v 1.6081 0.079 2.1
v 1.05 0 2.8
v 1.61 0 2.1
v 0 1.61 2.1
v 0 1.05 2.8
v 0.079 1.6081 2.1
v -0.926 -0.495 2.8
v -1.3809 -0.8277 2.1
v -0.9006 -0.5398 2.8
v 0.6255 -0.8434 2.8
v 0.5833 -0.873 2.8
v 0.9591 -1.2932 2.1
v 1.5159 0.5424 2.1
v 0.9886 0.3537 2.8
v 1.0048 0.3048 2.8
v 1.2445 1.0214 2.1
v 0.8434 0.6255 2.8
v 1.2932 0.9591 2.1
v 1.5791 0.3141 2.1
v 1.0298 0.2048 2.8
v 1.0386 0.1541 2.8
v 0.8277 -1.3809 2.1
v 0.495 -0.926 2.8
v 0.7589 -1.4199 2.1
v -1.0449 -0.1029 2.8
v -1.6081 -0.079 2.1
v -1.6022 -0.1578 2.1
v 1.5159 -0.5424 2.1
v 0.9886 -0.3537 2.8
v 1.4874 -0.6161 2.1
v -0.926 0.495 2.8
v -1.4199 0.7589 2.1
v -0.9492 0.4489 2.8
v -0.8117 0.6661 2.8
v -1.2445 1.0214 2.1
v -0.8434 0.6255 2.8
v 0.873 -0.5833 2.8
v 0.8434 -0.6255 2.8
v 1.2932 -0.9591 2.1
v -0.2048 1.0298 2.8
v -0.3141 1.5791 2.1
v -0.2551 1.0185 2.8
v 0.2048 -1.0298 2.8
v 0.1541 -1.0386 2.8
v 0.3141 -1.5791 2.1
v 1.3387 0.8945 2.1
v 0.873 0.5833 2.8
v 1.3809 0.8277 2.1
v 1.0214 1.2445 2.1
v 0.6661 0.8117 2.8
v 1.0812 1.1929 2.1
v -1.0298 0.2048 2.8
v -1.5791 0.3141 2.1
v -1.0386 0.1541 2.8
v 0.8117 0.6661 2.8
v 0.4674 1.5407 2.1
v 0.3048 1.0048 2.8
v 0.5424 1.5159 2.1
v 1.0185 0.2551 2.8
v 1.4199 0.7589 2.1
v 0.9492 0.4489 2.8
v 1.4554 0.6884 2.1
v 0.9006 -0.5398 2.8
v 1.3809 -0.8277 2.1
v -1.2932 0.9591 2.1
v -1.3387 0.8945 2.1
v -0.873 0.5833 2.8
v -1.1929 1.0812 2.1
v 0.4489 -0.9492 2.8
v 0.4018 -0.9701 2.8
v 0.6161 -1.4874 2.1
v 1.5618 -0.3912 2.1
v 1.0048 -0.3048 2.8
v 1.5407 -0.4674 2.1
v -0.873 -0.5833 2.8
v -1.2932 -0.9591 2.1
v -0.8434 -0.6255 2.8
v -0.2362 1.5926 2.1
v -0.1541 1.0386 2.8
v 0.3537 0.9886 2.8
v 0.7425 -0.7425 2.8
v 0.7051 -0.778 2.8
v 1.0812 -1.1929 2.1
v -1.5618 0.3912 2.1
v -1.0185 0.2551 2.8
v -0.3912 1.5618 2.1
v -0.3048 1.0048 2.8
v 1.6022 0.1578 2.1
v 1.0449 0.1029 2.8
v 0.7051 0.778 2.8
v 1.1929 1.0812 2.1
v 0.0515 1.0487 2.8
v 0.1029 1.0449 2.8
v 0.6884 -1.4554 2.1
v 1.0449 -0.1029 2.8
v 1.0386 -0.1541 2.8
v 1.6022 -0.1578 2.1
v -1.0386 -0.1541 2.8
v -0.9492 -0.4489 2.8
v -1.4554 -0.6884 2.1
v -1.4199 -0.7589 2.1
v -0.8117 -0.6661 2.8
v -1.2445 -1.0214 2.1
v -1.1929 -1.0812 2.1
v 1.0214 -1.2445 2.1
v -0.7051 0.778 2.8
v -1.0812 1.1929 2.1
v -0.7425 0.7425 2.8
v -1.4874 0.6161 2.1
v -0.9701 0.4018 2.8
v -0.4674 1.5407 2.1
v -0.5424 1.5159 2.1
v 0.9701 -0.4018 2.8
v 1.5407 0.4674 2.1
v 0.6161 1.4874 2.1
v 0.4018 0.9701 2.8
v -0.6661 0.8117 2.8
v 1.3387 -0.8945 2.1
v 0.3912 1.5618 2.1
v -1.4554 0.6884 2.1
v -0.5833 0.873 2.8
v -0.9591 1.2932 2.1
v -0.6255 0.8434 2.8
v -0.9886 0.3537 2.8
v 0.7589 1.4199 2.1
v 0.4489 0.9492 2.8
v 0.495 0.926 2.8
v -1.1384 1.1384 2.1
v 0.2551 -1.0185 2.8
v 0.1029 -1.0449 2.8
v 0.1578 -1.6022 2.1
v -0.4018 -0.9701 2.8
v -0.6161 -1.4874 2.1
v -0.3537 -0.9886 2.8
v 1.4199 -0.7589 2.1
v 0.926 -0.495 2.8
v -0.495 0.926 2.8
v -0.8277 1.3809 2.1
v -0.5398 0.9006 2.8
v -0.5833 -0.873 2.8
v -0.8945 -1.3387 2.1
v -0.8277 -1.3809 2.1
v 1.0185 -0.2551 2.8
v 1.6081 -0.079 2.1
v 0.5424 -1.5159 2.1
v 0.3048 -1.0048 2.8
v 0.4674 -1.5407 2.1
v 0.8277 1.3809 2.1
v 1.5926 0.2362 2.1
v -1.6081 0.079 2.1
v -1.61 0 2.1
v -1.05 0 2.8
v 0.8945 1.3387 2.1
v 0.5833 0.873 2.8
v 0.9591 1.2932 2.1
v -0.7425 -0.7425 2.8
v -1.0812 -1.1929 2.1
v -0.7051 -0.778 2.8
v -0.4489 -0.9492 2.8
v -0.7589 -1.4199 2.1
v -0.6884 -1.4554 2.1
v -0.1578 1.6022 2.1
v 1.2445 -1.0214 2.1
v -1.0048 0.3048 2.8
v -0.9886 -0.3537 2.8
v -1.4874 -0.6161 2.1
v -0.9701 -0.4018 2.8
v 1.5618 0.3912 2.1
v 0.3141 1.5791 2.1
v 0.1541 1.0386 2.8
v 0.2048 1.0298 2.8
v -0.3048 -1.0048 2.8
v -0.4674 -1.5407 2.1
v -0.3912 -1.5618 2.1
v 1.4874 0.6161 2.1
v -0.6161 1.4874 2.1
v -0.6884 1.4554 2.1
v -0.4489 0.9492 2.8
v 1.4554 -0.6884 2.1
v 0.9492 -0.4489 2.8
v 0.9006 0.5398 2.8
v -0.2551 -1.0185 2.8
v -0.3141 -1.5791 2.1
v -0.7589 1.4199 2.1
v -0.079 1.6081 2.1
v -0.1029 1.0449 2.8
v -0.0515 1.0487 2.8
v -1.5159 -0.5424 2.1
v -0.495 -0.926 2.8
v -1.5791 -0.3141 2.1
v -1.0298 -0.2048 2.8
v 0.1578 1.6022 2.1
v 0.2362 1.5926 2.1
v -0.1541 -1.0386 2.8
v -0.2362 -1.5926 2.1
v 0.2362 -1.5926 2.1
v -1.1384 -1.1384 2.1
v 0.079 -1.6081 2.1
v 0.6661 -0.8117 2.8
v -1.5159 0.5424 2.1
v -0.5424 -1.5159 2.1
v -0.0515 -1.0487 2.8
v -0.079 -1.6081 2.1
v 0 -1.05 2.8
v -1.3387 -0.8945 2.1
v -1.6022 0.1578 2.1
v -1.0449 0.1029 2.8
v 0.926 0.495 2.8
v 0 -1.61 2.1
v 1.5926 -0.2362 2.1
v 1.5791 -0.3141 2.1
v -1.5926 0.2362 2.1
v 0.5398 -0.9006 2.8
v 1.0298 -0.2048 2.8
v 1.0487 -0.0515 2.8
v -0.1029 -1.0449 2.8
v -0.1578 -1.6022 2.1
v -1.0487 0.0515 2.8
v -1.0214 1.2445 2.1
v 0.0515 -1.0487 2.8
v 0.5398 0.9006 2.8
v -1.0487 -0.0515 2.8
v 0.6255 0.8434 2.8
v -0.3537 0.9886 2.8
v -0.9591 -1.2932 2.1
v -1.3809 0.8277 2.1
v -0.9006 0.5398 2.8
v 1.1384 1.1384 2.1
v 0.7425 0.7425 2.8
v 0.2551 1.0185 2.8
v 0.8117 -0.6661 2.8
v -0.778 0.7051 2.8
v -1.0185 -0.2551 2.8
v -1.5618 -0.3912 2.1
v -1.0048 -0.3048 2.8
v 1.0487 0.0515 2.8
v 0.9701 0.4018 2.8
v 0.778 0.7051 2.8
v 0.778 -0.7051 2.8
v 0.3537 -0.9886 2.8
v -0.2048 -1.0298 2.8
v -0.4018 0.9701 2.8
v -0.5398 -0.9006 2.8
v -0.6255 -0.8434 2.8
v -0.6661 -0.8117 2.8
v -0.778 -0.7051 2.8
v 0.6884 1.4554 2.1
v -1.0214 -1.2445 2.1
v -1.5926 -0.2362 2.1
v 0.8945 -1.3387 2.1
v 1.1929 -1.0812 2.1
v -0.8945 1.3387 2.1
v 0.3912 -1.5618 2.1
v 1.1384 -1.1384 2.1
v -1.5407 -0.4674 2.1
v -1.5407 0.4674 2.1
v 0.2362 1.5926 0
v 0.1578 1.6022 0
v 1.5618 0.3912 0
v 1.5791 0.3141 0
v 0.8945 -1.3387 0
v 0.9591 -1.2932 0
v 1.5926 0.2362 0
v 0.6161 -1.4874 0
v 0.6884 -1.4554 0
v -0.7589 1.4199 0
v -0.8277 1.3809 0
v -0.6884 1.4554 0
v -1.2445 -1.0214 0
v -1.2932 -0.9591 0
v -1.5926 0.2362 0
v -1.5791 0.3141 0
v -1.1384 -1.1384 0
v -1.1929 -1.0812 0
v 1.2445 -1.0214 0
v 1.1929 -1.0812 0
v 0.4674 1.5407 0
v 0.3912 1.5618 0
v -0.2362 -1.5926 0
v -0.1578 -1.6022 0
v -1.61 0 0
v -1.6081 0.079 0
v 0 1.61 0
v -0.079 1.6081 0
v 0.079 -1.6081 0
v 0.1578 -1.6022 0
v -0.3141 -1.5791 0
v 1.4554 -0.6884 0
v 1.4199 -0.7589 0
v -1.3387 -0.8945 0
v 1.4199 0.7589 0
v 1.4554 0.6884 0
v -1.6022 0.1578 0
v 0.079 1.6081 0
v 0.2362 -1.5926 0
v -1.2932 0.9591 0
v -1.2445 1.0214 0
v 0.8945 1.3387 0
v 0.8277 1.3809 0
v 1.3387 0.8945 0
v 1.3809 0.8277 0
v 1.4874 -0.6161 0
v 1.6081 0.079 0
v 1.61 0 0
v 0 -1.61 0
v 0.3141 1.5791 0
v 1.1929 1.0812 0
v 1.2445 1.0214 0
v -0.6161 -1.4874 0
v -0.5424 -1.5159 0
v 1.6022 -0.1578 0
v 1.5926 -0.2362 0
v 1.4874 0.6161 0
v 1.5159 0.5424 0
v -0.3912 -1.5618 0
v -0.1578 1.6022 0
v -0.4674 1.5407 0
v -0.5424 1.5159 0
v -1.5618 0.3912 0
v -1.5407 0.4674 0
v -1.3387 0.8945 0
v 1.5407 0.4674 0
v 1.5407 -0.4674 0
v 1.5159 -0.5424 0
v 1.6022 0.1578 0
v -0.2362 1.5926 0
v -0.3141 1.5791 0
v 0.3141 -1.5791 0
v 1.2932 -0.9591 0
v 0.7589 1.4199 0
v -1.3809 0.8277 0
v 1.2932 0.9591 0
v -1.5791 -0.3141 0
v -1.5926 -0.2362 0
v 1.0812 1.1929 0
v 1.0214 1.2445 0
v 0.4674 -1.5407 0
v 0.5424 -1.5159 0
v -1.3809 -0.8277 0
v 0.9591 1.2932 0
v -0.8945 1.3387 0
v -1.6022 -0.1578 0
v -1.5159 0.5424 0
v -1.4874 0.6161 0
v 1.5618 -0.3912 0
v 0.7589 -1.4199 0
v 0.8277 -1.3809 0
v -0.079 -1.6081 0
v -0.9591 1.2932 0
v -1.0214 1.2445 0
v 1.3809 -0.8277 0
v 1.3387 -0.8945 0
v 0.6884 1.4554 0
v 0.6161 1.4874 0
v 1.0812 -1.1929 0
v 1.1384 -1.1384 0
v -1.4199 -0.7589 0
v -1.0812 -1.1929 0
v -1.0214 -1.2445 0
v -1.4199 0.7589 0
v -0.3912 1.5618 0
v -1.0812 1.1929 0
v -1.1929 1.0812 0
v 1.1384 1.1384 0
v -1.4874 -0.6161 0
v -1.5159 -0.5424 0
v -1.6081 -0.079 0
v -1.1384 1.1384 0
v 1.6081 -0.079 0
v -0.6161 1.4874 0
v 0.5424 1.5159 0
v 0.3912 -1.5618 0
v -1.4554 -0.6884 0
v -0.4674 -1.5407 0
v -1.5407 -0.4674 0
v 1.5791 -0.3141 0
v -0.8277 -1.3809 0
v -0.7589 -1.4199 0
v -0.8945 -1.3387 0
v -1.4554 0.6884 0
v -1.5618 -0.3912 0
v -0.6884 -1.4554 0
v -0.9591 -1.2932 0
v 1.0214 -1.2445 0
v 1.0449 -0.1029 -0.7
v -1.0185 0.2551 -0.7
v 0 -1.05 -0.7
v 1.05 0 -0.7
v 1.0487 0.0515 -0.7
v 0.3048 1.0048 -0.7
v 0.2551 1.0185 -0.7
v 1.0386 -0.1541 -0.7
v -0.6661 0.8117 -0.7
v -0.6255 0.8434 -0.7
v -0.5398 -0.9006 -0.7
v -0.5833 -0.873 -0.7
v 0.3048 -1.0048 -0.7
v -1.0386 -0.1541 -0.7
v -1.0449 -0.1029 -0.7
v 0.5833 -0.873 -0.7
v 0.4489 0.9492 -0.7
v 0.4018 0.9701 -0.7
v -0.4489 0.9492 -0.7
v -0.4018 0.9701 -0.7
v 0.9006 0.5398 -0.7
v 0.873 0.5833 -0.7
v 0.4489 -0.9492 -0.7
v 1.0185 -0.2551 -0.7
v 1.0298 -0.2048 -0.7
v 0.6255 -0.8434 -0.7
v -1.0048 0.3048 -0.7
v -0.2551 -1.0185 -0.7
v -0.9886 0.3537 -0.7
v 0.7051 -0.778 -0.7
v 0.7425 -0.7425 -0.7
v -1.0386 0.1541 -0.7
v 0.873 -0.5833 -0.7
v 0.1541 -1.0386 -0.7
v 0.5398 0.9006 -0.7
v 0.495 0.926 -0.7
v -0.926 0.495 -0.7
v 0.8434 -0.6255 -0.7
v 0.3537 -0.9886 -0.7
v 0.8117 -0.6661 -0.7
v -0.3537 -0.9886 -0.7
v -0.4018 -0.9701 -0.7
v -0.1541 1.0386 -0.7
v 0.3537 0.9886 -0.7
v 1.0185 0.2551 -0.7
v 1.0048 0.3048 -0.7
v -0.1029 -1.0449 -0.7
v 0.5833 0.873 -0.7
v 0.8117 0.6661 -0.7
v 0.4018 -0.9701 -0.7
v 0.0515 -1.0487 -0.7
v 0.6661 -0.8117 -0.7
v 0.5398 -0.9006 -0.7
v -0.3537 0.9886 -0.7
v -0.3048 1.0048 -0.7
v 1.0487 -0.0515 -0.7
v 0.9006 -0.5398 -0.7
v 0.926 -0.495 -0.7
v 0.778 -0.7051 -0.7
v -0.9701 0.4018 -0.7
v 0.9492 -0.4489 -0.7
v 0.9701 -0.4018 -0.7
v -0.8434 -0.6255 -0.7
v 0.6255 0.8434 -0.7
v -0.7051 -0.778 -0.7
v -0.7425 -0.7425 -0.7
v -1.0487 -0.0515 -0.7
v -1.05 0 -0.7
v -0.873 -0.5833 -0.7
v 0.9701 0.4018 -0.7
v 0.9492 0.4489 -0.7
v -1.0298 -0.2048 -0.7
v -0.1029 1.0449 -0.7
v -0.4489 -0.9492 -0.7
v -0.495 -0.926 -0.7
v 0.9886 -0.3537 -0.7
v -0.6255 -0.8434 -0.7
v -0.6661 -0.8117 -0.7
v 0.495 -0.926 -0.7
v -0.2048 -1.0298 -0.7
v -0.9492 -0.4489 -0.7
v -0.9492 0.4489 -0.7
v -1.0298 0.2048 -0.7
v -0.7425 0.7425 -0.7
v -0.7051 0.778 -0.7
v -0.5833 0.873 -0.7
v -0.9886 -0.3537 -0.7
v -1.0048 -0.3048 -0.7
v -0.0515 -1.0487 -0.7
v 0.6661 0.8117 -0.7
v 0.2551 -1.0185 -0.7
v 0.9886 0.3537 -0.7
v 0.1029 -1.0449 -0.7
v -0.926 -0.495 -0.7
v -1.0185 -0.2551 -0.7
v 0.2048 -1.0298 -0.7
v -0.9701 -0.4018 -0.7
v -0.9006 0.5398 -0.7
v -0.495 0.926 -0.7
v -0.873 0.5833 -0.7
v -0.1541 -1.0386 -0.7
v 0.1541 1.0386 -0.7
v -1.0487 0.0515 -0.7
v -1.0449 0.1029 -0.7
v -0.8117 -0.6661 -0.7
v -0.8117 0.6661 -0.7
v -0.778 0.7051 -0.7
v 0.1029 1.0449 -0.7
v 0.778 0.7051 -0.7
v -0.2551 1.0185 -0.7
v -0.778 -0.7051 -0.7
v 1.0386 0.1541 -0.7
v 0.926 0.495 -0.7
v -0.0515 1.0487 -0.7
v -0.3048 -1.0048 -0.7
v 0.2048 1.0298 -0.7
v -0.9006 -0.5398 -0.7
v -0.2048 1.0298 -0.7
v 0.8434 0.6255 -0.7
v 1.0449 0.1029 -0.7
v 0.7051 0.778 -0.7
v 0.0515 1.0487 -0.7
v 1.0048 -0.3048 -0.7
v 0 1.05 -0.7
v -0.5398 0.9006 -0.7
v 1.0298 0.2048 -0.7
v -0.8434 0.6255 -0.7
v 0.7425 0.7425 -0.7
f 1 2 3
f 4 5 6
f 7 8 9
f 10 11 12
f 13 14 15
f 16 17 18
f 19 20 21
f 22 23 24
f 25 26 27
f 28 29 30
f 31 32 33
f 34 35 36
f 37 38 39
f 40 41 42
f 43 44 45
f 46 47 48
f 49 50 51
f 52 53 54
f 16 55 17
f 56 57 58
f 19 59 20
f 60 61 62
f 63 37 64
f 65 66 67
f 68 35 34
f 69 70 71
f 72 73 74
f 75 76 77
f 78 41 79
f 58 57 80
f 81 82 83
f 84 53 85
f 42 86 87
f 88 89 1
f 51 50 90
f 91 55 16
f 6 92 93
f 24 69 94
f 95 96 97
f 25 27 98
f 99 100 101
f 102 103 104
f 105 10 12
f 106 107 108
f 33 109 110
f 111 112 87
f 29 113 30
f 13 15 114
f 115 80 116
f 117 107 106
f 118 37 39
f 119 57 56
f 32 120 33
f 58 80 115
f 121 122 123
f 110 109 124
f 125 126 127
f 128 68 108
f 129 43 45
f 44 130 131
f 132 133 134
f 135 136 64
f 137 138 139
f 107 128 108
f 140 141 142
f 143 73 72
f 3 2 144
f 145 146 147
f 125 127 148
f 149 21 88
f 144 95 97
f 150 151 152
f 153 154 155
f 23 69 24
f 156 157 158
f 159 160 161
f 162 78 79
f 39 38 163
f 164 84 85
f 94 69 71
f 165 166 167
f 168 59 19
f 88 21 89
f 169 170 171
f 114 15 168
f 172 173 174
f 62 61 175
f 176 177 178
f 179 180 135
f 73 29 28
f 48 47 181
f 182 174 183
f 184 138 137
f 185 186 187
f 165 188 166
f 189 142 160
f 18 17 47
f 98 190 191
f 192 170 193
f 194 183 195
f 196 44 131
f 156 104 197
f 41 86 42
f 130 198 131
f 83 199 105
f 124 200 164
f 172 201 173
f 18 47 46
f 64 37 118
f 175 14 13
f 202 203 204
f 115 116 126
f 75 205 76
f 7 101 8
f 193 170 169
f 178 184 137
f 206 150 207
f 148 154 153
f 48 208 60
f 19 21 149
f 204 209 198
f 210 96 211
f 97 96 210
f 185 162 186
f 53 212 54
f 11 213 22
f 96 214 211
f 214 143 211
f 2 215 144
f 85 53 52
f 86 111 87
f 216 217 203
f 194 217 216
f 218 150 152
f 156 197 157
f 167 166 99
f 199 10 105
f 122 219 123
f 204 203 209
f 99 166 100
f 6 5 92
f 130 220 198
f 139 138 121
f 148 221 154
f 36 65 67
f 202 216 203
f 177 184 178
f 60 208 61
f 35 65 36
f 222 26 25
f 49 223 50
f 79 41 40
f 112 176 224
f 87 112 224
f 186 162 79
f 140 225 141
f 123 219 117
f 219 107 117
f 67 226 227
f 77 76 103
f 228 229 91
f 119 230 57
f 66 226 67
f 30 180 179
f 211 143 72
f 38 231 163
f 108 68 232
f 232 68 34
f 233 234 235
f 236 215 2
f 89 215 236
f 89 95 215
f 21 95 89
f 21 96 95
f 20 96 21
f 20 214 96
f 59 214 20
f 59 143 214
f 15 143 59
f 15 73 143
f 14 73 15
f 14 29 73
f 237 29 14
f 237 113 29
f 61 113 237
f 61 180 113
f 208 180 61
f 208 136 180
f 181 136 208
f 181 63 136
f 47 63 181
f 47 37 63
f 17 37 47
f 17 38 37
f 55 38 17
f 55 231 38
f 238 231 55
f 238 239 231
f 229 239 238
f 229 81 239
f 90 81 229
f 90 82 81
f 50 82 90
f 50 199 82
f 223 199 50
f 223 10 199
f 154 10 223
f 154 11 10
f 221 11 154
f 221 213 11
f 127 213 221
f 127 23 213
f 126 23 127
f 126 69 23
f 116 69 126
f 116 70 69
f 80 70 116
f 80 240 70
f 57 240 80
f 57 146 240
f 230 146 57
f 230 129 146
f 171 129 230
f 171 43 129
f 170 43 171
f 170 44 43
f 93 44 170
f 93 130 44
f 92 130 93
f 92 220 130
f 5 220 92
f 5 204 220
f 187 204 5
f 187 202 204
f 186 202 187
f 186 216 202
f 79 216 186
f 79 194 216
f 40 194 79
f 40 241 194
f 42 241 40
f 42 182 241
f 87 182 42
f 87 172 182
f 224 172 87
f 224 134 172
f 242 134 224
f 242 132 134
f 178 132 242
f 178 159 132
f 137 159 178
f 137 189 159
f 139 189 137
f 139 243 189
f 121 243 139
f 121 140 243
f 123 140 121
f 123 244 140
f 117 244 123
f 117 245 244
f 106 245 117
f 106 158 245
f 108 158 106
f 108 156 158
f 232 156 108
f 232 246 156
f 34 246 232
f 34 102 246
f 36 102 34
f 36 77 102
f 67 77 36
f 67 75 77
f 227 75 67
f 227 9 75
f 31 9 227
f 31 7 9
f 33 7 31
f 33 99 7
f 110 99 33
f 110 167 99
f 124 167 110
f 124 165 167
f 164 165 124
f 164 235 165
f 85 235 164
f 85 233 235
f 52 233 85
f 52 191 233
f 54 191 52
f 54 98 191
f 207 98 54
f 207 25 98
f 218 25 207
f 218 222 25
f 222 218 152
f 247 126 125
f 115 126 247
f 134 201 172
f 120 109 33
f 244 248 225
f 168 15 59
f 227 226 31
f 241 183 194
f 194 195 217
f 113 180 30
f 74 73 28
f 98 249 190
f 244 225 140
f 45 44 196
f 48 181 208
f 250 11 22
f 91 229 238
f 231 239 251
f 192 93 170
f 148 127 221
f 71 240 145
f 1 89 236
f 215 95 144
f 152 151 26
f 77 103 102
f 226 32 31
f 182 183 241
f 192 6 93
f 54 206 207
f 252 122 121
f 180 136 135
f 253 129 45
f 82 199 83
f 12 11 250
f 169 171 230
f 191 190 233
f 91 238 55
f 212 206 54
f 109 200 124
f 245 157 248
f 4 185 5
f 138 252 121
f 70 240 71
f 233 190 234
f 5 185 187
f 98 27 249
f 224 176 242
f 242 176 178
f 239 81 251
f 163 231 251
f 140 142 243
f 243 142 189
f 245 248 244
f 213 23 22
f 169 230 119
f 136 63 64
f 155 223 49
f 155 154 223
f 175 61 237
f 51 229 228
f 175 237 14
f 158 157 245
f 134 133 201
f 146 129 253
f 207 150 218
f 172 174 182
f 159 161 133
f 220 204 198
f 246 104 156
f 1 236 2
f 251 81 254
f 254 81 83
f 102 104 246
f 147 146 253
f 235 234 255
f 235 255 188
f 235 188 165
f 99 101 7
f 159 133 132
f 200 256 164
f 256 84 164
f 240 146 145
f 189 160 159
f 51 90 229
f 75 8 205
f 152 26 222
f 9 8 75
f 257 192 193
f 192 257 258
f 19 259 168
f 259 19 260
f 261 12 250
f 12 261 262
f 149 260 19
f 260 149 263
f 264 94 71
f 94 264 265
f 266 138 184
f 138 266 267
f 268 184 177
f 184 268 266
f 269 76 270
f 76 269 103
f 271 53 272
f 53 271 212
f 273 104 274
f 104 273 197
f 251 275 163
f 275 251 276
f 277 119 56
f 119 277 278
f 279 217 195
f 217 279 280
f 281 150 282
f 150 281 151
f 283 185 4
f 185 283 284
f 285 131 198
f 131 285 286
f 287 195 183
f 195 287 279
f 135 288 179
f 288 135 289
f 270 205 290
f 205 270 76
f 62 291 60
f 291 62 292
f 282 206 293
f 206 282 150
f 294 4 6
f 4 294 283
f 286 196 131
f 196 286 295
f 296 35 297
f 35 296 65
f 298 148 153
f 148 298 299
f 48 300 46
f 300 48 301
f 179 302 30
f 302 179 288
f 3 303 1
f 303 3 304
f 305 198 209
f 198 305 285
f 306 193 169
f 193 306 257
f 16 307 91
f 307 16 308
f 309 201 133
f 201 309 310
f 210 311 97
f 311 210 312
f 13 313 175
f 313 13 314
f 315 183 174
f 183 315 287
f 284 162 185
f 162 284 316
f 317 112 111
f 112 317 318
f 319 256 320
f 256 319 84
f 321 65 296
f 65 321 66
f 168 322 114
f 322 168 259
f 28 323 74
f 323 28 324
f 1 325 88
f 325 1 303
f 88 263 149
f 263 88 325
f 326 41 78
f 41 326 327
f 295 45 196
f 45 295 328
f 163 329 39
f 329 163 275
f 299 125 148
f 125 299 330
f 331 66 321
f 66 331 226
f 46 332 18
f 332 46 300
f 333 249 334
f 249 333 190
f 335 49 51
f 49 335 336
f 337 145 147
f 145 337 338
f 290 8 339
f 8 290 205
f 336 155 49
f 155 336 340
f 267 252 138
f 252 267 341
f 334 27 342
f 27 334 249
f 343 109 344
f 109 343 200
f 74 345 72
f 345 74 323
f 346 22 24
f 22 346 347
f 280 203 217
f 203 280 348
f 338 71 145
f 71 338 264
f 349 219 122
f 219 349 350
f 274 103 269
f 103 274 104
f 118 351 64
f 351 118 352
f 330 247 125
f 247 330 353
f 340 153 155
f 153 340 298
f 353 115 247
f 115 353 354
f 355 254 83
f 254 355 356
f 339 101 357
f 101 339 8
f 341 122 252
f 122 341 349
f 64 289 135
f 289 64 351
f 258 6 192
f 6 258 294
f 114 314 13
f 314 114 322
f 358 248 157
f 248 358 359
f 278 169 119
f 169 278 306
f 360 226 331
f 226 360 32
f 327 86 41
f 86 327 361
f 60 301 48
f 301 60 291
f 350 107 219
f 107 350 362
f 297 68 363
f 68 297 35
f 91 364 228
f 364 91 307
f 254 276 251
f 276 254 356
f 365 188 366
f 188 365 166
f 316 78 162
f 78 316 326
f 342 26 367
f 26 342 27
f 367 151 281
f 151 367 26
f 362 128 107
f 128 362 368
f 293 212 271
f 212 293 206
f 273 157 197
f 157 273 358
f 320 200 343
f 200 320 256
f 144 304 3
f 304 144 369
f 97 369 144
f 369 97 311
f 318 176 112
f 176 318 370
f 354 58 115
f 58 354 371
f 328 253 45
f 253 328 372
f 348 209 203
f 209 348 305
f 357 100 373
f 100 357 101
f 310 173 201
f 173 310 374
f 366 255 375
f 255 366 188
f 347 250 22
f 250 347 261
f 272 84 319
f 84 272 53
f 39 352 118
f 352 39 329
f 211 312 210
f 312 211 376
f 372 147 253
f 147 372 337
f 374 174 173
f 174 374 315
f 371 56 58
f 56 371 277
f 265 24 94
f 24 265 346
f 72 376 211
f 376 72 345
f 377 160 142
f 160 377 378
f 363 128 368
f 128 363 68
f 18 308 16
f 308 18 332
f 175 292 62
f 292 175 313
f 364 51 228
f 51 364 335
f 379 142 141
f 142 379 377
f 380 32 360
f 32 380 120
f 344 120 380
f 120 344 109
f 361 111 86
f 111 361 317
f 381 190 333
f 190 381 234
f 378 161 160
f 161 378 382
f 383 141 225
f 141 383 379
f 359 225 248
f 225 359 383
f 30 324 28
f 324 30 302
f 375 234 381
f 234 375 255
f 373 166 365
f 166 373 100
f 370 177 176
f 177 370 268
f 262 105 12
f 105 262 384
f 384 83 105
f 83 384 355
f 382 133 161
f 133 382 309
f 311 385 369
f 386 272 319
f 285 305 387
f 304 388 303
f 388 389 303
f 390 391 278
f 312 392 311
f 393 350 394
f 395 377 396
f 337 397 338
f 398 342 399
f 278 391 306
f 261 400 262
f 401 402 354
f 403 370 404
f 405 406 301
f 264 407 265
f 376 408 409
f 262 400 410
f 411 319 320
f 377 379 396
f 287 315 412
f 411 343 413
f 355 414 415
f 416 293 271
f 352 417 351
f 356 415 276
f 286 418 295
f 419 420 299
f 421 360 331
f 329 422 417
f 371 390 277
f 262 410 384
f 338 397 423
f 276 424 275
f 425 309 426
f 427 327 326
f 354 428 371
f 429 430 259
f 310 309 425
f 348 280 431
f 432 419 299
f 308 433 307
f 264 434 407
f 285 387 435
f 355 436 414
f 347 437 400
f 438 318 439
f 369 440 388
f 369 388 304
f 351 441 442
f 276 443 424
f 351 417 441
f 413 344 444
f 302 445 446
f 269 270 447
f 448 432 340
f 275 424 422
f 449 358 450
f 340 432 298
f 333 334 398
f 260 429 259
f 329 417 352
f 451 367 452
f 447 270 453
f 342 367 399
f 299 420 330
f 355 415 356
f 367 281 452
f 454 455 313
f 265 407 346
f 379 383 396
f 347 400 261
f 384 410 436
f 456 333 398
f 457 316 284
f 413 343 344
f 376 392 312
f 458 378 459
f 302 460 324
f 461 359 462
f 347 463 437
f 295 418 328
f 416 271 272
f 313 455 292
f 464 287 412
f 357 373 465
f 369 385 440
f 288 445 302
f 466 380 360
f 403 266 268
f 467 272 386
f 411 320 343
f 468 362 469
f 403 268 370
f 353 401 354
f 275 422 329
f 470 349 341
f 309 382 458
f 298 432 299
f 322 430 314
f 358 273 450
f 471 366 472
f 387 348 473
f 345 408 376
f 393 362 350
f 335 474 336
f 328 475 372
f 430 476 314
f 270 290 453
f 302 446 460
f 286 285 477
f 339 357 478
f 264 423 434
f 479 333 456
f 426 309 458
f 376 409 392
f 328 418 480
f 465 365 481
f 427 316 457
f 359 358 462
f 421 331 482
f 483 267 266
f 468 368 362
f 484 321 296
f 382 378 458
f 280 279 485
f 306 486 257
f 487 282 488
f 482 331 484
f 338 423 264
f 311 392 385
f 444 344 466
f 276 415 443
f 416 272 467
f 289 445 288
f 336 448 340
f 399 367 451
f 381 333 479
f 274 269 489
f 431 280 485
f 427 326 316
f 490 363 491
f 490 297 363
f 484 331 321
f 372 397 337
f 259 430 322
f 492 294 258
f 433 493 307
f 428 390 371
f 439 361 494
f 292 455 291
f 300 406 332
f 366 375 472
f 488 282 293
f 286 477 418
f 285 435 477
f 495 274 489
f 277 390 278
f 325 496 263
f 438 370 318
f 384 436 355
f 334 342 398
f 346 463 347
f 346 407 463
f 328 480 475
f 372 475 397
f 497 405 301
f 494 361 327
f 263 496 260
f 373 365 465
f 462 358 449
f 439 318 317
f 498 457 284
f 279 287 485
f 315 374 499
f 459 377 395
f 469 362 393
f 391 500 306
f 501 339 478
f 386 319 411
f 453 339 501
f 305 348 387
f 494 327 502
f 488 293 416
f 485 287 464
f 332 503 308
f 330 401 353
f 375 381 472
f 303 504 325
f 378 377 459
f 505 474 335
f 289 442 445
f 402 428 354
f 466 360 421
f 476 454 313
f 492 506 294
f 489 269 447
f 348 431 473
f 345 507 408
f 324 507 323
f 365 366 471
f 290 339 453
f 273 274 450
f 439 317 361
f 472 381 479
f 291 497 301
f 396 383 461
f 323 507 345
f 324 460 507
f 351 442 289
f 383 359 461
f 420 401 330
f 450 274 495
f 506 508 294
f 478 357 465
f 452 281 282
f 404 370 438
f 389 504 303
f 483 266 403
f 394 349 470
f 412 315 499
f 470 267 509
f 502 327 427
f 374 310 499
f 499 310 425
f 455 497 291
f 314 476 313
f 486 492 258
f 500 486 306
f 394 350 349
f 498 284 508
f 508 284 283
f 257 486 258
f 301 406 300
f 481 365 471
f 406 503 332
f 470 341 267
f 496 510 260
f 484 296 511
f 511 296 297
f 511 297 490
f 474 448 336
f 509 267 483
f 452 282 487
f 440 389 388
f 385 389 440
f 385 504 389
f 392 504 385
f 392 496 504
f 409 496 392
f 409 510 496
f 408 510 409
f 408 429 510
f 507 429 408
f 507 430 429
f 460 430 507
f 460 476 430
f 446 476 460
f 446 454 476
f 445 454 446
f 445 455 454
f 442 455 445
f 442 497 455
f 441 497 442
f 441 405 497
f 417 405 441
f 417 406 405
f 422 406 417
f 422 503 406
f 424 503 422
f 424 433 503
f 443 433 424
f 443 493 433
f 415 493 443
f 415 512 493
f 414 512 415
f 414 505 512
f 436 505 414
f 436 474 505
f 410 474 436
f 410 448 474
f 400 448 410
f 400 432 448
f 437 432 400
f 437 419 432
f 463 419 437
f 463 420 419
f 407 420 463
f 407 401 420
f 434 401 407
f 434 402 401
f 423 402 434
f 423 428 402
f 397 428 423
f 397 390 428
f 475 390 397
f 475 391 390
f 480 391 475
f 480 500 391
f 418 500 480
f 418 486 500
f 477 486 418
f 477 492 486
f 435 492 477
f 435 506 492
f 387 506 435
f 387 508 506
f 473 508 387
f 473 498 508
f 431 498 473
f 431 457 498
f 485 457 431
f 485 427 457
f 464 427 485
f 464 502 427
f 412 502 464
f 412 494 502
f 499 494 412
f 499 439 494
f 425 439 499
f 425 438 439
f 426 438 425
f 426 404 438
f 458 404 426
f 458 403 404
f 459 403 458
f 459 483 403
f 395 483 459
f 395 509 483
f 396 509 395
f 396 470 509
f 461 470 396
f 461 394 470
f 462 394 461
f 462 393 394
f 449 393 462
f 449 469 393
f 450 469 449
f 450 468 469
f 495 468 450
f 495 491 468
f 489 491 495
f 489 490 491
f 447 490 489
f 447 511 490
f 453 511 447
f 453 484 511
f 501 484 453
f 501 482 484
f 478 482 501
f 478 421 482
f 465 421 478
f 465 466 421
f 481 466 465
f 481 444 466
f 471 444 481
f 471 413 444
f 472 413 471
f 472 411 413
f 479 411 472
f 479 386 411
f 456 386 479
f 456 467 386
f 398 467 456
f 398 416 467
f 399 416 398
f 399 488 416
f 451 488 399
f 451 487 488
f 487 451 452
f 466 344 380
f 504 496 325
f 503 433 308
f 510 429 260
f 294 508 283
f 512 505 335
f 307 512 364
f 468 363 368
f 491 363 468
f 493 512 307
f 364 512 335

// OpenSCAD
//A 19x19 board should measure 454.5 mm from top to bottom by 424.2 mm from left to right. It should be 151.5 mm thick.

// The lines are typically 1 mm thick. They should be spaced 22 mm apart left to right and 23.7 mm apart top to bottom.

// Star point markers are typically 4 mm in diameter.
//svg fix https://www.svgminify.com/

xSpacing=23.7;
ySpacing=22;
lThickness=1;
starR=2;
borderW=14;
thickness=4;
lineDepth=0.2;
stoneR=11.05;

$fn=128;

// color("black")
// scale(0.7) stone(7.5);
scale(0.7) {
  translate([0,0,3]) cylinder(r1=2.3, r2=1.5,h=1);
  cylinder(r=2.3,h=3);
  translate([0,0,-1]) cylinder(r2=2.3, r1=1.5,h=1);
}
// scale(0.7) halfStone();

// stlGoClubBoard();

// scale(1.7) {
  // bowl();
 // translate([0,0,17.8]) lid();
// }
// cherryBlossomBoard();
//dragonPhoenixBoard();

// board9x9();

module halfStone() {
  difference() {
    stone(100);
    translate([0,0,-100]) cylinder(r=100,h=100);
    translate([0,0,-0.1]) cylinder(r=2.5,h=3.1);
   // translate([0,-1000,0]) cube([1000,2000,1000]);
  }
}

module dragonPhoenixBoard() {
  scale([0.7,0.7,1]) difference() {
    board13x13();
    // phoenix();
    // dragon();
    dragonOutline();
    phoenixOutline();
  }
}

module dragonShape() {
  render() translate([-4,20]) mirror([1,0,0]) scale(0.22) rotate([0,0,90]) difference() {
    translate([300,1]) square([260,740]);
    import("dragon-phoenix-simplified.svg");
  }
}

module phoenixShape() {
  render() translate([0,-157]) scale(0.22) rotate([0,0,85]) difference() {
    translate([0,1]) square([300,740]);
    import("dragon-phoenix-simplified.svg");
  }
}

module dragonOutline() {
  color("black")
  translate([0,0,-0.01]) 
  linear_extrude(height=0.02)
  difference() {
    offset(r=1) dragonShape();
    dragonShape();
  }
}

module dragon() {
  color("#00918d")
  // translate([0,0,-0.01]) 
  linear_extrude(height=0.02) dragonShape();
}
module phoenixOutline() {
  color("black")
  translate([0,0,-0.01]) 
  linear_extrude(height=0.02)
  difference() {
    offset(r=1) phoenixShape();
    phoenixShape();
  }
}

module phoenix() {
  color("#8c2f12") 
  // translate([0,0,-0.01]) 
  linear_extrude(height=0.02) phoenixShape();
}

module cherryBlossomBoard() {
  difference() {
    scale([0.7,0.7,1]) board13x13();
    translate([-128,-128,-0.1]) color("pink") linear_extrude(height=0.2) projection()  import("cherryblossom.stl");
  }
}

module cherryBlossoms() {
  translate([0,0,-0.01]) linear_extrude(height=0.02) projection() linear_extrude(height=1) {
      translate([48,-100,0]) scale(0.35) import("cherryblossombutterfly_Layer 1.svg");
      translate([-105,45,0]) scale(0.35) import("cherryblossombutterfly_Layer 2.svg");
  }
}

module lid() {
  $fn=128;

  scale([1,1,0.3]) difference() {
    union() {
      sphere(r=21);
      cylinder(r=21.1,h=2.5);
    }
    translate([-25,-25,-50]) cube([50,50,50]);
    translate([0,0,-2]) sphere(r=20.5);
  }
  translate([0,0,-2]) difference() {
    union() {
      intersection() {
        cylinder(r=17.9,h=10);
        translate([0,0,2]) scale([1,1,0.3]) sphere(r=21);
      }
      nubR=0.75;
      nubD=17.7;
      nubZ=0.75;

      translate([nubD,0,nubZ]) sphere(r=nubR);
      rotate([0,0,360/3]) translate([nubD,0,nubZ]) sphere(r=nubR);
      rotate([0,0,360/3*2]) translate([nubD,0,nubZ]) sphere(r=nubR);
    }
    translate([0,0,0]) scale([1,1,0.3]) sphere(r=17.4);
  }

}

module bowl() {
  $fn=128;

  nubR=0.9;
  nubD=17.7;
  difference() {
    bowlShape();
    cylinder(r=18,h=50);
    scale(0.92) bowlShape();
    translate([nubD,0,10]) cylinder(r=nubR,h=5);
    rotate([0,0,360/3]) translate([nubD,0,10]) cylinder(r=nubR,h=5);
    rotate([0,0,360/3*2]) translate([nubD,0,10]) cylinder(r=nubR,h=5);
  }
}

module bowlShape() {
 hull() rotate_extrude(angle=360) 
  translate([14,0,0])  
    {
      intersection() {
        scale([1,1.6]) circle(r=10);
        translate([-10,0]) square([20,14]);
      }
      intersection() {
        circle(r=10);
        translate([-10,-10]) square([20,10]);
      }
    }
}


module clubName() {
  translate([103,-95,0]) mirror([1,0,0]) linear_extrude(1) {
    translate([0,9]) text("St. Louis Go Club", font = "Arial Black:Bold", size = 6.5);
    text("https://baduk.club/club/stl", font = "Arial Black:Bold", size = 4);
  }
}

module clubText() {
  render()
    translate([87,81,0]) qrCode();
    rotate([0,0,180]) translate([87,81,0]) qrCode();
    translate([0,0,0]) clubName();
    translate([0,0,0]) rotate([0,0,180]) clubName();
}

module stlGoClubBoard() {
  difference() {
    scale([0.7,0.7,1]) board13x13(); 
    color("black") translate([0,0,-0.99]) clubText();
  }
}

module qrCode() {
  linear_extrude(height = 1) scale(0.1) import("stlgoclub-mono.svg", center=true);
}

module qrBox() {
  hull() {
    translate([13,13,0]) cylinder(r=4,h=1);
    translate([13,-13,0]) cylinder(r=4,h=1);
    translate([-13,-13,0]) cylinder(r=4,h=1);
    translate([-13,13,0]) cylinder(r=4,h=1);
  }
}

module stone(sh) {
  intersection() {
    scale([1,1,0.4]) sphere(r=11.05,$fn=64);
    translate([0,0,-sh/2]) cylinder(r=12,h=sh);
  }
}


module board9x9() {
  size=[9,9];
  starPoints=[
    [2,2],
    [2,6],
    [4,4],
    [6,2],
    [6,6]
  ];
  board(size,starPoints);
}

module board13x13() {
  size=[13,13];
  starPoints=[
    [3,3],
    [3,9],
    [6,6],
    [9,3],
    [9,9]
  ];
  difference() {
  board(size,starPoints);

      color("black") translate([0,0,-0.8]) grid(  
      size=[9,9],
      starPoints=[
        [2,2],
        [2,6],
        [4,4],
        [6,2],
        [6,6]
      ]);
  }
}

module board(size,starPoints) {
  boardXW=(size[0]-1)*xSpacing+lThickness+borderW*2;
  boardYW=(size[1]-1)*ySpacing+lThickness+borderW*2;
  
  difference() {
    translate([boardXW/-2,boardYW/-2,0]) color("#bda070") cube([boardXW,boardYW,thickness]);
    color("black") translate([0,0,thickness-lineDepth]) grid(size,starPoints);
  }
}

module grid(size,starPoints) {
  translate([lThickness/2-(size[0]-1)*xSpacing/2,lThickness/2-(size[1]-1)*ySpacing/2,0]) {
    for (p = [ 0 : len(starPoints) - 1 ]) {
      translate([starPoints[p][0]*xSpacing,starPoints[p][1]*ySpacing,0]) cylinder(r=starR,h=1);
    }

    for ( y = [0 : size[1]-1] ) {
      hull() {
        translate([0,y*ySpacing,0]) cylinder(r=lThickness/2,h=1);
        translate([(size[0]-1)*xSpacing,y*ySpacing,0]) cylinder(r=lThickness/2,h=1);
      }
    }

    for ( x = [0 : size[0]-1] ) {
      hull() {
        translate([x*xSpacing,0,0]) cylinder(r=lThickness/2,h=1);
        translate([x*xSpacing,(size[0]-1)*ySpacing,0]) cylinder(r=lThickness/2,h=1);
      }
    }
  }
}
